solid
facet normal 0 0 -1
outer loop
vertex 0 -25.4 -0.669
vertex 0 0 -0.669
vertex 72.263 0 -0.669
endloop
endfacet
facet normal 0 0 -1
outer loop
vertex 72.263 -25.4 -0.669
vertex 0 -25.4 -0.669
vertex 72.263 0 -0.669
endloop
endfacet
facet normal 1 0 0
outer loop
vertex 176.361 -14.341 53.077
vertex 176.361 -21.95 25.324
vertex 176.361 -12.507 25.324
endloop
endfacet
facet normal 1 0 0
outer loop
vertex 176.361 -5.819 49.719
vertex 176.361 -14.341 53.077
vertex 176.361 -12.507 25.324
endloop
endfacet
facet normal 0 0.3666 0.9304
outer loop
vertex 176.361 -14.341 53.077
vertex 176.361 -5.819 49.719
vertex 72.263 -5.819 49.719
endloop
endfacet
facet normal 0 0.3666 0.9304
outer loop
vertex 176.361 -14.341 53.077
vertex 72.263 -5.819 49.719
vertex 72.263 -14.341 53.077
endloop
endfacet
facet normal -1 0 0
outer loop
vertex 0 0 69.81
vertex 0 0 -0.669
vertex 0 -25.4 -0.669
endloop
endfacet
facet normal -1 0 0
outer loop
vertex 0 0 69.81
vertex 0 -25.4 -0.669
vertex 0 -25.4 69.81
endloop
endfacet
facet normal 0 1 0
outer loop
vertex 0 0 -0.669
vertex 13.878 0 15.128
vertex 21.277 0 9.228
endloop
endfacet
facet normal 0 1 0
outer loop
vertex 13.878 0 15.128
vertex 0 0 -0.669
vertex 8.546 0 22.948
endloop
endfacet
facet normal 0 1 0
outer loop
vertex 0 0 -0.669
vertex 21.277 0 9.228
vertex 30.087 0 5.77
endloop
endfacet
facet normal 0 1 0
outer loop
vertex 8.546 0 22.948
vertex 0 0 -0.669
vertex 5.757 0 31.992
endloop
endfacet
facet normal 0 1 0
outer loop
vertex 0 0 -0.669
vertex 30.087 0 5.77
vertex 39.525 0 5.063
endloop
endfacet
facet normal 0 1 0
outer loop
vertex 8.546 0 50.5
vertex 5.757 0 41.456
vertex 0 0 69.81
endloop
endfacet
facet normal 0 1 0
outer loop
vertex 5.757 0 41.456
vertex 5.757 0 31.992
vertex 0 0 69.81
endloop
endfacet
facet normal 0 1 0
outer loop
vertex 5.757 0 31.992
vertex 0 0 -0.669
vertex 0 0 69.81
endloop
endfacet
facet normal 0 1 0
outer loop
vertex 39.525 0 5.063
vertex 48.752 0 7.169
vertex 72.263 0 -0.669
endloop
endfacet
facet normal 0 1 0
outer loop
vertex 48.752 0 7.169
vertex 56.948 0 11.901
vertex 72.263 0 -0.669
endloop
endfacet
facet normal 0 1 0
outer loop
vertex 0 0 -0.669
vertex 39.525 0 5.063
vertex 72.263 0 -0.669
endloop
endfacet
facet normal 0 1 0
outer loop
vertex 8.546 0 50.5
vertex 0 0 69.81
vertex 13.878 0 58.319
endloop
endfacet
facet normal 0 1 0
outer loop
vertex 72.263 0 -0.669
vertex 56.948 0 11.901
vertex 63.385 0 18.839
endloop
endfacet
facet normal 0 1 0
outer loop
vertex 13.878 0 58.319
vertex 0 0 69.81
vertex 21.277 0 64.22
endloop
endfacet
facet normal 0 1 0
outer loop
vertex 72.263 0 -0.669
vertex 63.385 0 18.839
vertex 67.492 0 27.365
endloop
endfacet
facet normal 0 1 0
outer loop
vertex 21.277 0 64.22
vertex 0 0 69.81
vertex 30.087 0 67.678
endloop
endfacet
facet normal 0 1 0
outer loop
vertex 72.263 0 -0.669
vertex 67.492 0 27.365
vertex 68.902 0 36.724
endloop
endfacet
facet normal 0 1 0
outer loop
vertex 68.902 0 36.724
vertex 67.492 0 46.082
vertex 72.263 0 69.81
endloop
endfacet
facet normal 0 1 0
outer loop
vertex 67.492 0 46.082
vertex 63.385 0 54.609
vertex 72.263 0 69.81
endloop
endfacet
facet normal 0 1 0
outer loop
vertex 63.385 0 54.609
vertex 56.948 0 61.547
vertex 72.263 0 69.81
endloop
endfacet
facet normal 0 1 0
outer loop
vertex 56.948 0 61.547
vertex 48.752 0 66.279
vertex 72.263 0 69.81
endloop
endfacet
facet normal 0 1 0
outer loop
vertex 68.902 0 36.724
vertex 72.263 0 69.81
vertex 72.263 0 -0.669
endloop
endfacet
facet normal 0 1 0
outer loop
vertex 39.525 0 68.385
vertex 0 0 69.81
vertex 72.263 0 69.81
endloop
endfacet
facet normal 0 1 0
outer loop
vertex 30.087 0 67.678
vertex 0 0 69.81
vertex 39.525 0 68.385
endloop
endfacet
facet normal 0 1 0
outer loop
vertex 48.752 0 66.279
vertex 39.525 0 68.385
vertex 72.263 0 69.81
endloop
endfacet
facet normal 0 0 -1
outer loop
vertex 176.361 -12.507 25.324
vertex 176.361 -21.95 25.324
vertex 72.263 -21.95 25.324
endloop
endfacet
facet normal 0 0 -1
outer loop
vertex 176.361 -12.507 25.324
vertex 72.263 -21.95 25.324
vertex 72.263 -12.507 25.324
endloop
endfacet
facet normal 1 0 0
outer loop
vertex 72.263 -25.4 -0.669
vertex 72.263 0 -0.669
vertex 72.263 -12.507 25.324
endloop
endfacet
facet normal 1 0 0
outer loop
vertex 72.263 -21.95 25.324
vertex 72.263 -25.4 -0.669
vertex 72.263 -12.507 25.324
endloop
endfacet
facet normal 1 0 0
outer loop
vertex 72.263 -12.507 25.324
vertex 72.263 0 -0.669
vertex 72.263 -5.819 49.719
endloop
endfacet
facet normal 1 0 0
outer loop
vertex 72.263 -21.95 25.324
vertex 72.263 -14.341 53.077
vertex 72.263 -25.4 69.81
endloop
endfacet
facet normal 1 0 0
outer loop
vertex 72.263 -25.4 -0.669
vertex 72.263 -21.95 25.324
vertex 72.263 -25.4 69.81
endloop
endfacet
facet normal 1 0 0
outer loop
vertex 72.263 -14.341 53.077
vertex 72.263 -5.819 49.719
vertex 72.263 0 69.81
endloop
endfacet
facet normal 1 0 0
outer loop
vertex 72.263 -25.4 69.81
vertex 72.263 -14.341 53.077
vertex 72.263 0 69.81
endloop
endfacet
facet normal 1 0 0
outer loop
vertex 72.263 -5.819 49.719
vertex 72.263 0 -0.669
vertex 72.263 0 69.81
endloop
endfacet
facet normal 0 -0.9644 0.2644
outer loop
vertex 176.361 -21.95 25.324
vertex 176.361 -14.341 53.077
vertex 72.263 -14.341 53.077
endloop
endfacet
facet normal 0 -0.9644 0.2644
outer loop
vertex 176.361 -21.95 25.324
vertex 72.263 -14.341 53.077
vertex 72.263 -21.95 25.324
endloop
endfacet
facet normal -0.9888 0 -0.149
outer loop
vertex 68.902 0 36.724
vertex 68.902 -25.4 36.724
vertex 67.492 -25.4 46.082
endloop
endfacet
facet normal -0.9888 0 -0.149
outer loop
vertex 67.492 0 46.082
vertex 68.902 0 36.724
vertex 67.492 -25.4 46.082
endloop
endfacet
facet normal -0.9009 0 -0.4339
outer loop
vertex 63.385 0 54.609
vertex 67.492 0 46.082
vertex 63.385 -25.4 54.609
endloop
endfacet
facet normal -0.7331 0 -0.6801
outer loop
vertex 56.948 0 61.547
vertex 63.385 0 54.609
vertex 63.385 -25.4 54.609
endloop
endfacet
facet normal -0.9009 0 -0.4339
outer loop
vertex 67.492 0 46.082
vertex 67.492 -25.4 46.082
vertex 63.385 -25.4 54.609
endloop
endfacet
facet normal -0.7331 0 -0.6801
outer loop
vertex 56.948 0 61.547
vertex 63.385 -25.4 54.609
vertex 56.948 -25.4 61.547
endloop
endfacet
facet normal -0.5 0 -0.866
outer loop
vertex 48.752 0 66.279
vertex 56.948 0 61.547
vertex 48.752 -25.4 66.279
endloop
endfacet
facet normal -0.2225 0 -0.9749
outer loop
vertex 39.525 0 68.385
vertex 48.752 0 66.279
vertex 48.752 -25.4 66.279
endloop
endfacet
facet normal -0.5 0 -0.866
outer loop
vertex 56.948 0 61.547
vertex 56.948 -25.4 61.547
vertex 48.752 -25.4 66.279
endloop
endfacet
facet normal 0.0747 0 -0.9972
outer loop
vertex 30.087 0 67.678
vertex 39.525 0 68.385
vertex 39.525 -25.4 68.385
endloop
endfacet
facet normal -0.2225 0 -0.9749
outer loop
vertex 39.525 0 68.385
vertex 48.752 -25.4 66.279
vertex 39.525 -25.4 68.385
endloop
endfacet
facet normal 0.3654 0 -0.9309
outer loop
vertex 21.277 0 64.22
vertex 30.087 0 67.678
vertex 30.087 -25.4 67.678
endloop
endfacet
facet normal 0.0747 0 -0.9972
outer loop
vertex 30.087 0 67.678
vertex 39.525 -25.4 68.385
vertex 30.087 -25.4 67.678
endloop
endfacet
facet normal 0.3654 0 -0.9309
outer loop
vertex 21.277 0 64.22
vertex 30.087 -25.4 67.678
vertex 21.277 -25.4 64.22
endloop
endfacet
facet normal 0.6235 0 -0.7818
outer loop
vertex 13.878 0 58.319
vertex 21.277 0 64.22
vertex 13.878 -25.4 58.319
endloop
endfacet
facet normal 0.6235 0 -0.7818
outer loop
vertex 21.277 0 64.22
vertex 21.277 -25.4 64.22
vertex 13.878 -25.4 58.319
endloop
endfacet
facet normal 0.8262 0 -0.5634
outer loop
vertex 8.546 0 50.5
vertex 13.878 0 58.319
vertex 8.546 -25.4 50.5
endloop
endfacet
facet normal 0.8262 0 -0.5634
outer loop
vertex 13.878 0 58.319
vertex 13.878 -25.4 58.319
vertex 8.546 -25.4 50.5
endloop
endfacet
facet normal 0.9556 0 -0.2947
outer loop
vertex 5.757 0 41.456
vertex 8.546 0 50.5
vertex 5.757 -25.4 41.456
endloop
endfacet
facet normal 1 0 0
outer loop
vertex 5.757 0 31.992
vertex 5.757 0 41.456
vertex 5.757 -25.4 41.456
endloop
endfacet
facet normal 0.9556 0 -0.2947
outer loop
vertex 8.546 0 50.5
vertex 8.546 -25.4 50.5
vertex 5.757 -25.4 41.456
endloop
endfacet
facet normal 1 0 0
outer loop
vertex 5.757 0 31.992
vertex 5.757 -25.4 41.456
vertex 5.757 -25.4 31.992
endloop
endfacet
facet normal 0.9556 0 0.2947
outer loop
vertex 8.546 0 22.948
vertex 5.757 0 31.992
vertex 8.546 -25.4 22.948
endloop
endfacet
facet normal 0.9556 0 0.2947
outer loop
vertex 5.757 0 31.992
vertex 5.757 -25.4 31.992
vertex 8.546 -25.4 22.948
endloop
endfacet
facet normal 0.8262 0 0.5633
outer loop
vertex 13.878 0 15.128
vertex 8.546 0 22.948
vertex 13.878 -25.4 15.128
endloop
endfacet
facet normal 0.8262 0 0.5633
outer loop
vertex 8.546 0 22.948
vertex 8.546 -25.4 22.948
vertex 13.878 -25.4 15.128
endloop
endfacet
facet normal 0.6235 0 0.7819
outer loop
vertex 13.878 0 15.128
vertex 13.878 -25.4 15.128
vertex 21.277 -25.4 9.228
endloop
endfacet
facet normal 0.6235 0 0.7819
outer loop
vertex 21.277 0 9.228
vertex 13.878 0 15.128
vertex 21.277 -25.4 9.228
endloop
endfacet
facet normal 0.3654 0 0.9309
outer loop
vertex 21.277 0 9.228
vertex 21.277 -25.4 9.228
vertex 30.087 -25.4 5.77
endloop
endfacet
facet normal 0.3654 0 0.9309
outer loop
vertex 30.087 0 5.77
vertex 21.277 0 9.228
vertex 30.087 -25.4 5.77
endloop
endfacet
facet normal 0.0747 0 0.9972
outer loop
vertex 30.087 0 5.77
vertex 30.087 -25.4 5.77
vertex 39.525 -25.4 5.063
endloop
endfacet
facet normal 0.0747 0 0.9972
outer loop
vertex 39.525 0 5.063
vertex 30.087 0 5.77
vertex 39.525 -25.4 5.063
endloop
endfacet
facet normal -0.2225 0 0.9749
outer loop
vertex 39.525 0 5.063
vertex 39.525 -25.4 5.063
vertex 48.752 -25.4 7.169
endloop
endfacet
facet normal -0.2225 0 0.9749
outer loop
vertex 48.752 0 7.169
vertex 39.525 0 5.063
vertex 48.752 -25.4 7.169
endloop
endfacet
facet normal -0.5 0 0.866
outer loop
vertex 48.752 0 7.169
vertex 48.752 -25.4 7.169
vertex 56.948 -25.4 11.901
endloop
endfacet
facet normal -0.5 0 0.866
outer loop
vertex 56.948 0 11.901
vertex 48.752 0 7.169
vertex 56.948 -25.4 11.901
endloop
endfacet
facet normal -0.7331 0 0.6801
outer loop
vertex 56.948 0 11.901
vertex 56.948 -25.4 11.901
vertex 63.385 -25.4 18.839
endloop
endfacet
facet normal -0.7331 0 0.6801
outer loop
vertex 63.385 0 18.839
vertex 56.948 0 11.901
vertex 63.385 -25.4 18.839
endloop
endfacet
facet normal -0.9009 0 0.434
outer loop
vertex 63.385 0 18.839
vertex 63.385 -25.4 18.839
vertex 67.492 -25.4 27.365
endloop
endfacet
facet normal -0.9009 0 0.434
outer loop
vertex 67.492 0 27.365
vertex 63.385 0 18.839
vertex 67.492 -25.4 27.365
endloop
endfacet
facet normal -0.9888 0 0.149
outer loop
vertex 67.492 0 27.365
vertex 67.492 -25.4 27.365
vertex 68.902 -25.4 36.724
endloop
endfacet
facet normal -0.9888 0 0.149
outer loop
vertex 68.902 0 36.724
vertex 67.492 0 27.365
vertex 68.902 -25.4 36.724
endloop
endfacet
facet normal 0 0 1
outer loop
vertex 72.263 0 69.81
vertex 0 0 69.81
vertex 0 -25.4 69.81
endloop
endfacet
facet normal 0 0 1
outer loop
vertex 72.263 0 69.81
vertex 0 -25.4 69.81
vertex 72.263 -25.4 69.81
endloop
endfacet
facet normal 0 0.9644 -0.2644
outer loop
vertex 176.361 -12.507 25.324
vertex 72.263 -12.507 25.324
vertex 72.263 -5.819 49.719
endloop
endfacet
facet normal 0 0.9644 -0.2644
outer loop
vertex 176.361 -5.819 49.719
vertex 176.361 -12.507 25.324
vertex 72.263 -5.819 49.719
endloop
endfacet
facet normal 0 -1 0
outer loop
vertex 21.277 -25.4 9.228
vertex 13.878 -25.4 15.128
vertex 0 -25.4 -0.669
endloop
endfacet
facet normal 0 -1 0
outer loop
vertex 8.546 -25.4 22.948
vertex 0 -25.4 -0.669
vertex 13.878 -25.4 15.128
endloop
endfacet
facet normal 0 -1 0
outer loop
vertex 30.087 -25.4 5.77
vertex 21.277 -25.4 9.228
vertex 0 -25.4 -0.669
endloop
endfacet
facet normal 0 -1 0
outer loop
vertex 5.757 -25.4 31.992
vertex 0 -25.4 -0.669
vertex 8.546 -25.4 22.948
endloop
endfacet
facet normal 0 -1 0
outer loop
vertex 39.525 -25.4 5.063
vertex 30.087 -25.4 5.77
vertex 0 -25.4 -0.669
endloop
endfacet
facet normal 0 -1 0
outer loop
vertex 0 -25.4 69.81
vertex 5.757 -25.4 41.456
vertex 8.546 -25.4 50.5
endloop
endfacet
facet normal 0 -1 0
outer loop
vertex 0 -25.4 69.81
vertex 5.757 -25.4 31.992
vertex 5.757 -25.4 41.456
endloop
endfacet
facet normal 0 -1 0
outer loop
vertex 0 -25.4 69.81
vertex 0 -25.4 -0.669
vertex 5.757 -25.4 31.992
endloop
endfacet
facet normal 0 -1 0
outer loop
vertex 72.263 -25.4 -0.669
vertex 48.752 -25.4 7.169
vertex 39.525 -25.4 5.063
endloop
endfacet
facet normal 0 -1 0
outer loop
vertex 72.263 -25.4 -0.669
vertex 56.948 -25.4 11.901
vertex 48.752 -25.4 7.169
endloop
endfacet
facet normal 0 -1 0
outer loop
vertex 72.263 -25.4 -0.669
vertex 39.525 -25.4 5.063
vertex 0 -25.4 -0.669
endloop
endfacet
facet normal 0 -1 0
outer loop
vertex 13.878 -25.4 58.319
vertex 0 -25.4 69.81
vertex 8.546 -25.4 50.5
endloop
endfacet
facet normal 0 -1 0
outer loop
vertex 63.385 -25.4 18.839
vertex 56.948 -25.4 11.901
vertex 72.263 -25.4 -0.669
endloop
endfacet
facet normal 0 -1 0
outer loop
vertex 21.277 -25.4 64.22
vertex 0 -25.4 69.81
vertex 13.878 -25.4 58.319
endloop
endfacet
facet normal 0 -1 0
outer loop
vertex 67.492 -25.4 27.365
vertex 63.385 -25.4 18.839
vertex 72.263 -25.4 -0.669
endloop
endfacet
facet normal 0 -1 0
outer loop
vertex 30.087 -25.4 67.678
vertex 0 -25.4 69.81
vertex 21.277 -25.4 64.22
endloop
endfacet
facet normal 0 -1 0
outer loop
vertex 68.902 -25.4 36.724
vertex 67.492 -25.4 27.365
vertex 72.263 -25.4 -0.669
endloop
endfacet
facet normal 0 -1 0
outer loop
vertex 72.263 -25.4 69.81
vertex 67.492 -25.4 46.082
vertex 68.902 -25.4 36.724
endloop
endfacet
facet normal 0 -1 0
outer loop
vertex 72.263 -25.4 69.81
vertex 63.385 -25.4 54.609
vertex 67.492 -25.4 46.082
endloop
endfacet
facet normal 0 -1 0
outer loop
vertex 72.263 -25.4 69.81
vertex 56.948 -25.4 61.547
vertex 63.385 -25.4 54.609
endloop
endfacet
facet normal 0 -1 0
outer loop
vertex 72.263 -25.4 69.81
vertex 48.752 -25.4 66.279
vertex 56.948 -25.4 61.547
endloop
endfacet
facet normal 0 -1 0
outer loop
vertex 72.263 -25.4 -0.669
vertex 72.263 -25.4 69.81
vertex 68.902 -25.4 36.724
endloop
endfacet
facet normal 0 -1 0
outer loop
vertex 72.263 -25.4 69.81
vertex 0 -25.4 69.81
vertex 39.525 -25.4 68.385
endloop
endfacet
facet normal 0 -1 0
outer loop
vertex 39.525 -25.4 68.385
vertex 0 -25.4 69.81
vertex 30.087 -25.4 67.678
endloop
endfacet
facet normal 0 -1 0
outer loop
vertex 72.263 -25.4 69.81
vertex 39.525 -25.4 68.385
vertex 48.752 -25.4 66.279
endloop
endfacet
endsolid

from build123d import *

# Parameters (mm, degrees)
F0_W     = 72.2630545497
F0_H     = 70.4785098787
F1_DEPTH = 25.4
F2_R     = 31.75
F3_DEPTH = 25.401
F5_DEPTH = 104.0980848


# Not quite as in the source:
# - an extrude ends at something that could not be found from the text; its depth is read off the source's solid


with BuildPart() as f1:
    # F0 (on Front) → F1 (new body)
    with BuildSketch(Plane.XZ):
        with Locations((36.1315272748, 34.5705245854)):
            Rectangle(F0_W, F0_H)
    extrude(amount=F1_DEPTH)

    # F2 (on face) → F3 (cut, through all)
    with BuildSketch(Plane.XZ.offset(25.4)):
        with Locations((37.1520854533, 36.7239564657)):
            Circle(F2_R)
    extrude(amount=-F3_DEPTH, mode=Mode.SUBTRACT)

    # F4 (on face) → F5 (join, through all)
    with BuildSketch(Plane.YZ.offset(72.2630545497)):
        Polygon((-12.5073632225, 25.324318558), (-5.8186161332, 49.7185699642), (-14.3406965322, 53.0769830369), (-21.9502989203, 25.324318558), align=None)
    extrude(amount=F5_DEPTH)


solid = f1.part
